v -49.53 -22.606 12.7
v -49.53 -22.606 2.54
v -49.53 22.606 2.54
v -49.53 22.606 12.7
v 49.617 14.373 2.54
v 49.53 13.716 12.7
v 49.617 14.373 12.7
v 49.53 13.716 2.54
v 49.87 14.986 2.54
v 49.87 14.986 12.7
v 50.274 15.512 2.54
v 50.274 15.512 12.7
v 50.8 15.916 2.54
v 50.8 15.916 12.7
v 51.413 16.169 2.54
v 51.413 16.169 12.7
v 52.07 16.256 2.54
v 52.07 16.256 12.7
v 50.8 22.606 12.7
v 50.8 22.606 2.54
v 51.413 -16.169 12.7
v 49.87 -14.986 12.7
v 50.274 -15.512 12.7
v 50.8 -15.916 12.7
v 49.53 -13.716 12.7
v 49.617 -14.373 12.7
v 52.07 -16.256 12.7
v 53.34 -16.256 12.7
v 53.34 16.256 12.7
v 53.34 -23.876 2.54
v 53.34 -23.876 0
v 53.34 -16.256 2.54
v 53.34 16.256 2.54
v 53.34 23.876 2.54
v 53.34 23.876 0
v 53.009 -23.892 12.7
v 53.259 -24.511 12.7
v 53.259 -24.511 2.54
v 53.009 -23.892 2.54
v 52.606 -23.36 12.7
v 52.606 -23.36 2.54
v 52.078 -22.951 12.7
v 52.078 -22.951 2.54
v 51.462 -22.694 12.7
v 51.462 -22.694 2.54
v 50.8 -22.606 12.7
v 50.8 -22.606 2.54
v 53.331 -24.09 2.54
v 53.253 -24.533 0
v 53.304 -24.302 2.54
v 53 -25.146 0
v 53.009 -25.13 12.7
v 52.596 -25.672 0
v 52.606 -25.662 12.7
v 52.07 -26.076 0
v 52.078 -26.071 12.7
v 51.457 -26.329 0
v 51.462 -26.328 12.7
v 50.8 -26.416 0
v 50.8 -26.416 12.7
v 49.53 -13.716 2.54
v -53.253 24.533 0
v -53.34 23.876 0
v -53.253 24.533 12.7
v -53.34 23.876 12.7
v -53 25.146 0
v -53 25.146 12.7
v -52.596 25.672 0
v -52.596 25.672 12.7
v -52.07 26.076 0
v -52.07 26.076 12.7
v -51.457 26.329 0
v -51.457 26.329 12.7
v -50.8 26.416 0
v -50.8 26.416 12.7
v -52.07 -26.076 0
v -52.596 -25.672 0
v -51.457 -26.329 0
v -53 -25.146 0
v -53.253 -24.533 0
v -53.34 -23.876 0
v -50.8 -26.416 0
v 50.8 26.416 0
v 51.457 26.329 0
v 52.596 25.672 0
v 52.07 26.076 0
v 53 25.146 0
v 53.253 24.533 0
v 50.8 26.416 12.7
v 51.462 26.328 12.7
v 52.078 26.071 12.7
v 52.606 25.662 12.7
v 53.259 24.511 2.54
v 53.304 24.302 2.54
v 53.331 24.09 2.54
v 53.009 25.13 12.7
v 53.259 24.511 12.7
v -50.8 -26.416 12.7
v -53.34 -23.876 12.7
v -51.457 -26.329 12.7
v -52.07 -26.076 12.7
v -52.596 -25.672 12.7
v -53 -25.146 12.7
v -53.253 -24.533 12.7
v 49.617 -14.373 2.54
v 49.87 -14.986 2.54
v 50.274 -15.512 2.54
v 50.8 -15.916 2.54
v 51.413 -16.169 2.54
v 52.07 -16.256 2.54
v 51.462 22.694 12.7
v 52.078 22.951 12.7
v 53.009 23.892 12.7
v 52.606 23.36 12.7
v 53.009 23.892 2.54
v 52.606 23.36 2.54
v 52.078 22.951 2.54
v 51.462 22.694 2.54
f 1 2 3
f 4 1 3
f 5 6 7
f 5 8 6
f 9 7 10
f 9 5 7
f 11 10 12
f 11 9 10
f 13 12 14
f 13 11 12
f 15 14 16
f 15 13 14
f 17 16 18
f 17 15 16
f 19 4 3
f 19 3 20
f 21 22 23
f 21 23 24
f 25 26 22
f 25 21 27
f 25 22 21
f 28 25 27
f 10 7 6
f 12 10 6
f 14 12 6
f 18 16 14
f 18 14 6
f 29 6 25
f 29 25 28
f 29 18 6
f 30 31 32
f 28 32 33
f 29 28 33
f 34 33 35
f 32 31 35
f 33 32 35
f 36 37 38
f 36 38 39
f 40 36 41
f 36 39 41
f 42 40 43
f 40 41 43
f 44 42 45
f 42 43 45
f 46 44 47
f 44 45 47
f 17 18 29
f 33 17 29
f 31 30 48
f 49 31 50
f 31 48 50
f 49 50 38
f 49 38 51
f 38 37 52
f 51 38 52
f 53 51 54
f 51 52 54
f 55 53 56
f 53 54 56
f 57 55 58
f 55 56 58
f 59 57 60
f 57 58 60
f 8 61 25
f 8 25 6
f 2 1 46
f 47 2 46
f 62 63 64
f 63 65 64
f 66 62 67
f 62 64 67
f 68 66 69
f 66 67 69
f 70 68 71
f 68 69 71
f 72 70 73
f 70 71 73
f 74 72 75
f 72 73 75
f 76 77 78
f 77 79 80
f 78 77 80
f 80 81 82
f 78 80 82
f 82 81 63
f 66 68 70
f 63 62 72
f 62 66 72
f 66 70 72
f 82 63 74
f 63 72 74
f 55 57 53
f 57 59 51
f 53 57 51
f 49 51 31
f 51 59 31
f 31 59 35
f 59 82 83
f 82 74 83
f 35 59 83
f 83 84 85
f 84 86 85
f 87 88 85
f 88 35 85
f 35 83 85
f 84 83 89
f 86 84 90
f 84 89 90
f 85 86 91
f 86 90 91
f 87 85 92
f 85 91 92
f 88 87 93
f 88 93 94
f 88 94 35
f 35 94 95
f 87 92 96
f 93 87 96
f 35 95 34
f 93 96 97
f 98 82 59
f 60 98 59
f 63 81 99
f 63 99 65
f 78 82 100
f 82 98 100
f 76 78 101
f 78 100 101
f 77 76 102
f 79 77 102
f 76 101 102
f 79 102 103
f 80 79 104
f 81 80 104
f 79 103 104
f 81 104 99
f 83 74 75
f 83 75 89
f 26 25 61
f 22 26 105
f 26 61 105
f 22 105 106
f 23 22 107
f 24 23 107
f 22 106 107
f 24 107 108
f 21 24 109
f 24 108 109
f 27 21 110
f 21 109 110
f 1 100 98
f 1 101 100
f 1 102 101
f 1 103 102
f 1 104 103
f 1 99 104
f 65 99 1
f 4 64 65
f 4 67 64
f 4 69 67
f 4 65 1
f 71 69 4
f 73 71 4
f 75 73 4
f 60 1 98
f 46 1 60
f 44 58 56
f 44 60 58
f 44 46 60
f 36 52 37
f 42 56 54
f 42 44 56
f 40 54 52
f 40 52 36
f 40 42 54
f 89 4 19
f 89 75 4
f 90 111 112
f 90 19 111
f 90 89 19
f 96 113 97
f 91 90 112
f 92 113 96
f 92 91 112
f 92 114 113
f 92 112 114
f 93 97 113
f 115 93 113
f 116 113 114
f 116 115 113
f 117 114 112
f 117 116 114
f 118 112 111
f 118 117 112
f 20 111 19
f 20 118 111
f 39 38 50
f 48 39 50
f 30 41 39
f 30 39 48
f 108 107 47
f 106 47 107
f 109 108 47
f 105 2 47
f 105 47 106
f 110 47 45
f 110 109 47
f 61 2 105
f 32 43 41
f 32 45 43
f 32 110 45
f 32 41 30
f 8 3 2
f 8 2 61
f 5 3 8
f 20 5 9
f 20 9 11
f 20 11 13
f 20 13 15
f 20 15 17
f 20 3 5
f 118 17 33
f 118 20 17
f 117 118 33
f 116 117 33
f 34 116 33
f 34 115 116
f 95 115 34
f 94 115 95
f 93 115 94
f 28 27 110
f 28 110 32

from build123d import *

# Parameters (mm, degrees)
F0_W     = 106.68
F0_H     = 52.832
F0_W_2   = 99.06
F0_H_2   = 45.212
F1_DEPTH = 12.7
F2_W     = 99.06
F2_H     = 45.212
F3_DEPTH = 2.54
F4_W     = 3.81
F4_H     = 6.35
F5_DEPTH = 10.16
F6_R     = 2.54


with BuildPart() as f1:
    # F0 (on Top) → F1 (new body)
    with BuildSketch(Plane.XY):
        Rectangle(F0_W, F0_H)
        Rectangle(F0_W_2, F0_H_2, mode=Mode.SUBTRACT)
    extrude(amount=F1_DEPTH)

    # F2 (on Top) → F3 (join)
    with BuildSketch(Plane.XY):
        Rectangle(F2_W, F2_H)
    extrude(amount=F3_DEPTH)

    # F4 (on face) → F5 (cut)
    with BuildSketch(Plane.XY.offset(12.7)):
        with Locations((51.435, 19.431)):
            Rectangle(F4_W, F4_H)
        with Locations((51.435, -19.431)):
            Rectangle(F4_W, F4_H)
    extrude(amount=-F5_DEPTH, mode=Mode.SUBTRACT)

    # F6 (call 1 of 8: OpenCascade refuses the feature's edges together)
    f6_edges = [f1.edges().sort_by_distance(p)[0] for p in [
        (49.53, 16.256, 7.62),
    ]]
    fillet(f6_edges, radius=F6_R)

    # F6#2 (call 2 of 8)
    f6_2_edges = [f1.edges().sort_by_distance(p)[0] for p in [
        (53.34, 22.606, 7.62),
    ]]
    fillet(f6_2_edges, radius=F6_R)

    # F6#3 (call 3 of 8)
    f6_3_edges = [f1.edges().sort_by_distance(p)[0] for p in [
        (49.53, -16.256, 7.62),
    ]]
    fillet(f6_3_edges, radius=F6_R)

    # F6#4 (call 4 of 8)
    f6_4_edges = [f1.edges().sort_by_distance(p)[0] for p in [
        (53.34, -22.606, 7.62),
    ]]
    fillet(f6_4_edges, radius=F6_R)

    # F6#5 (call 5 of 8)
    f6_5_edges = [f1.edges().sort_by_distance(p)[0] for p in [
        (53.34, 26.416, 6.35),
    ]]
    fillet(f6_5_edges, radius=F6_R)

    # F6#6 (call 6 of 8)
    f6_6_edges = [f1.edges().sort_by_distance(p)[0] for p in [
        (53.34, -26.416, 6.35),
    ]]
    fillet(f6_6_edges, radius=F6_R)

    # F6#7 (call 7 of 8)
    f6_7_edges = [f1.edges().sort_by_distance(p)[0] for p in [
        (-53.34, -26.416, 6.35),
    ]]
    fillet(f6_7_edges, radius=F6_R)

    # F6#8 (call 8 of 8)
    f6_8_edges = [f1.edges().sort_by_distance(p)[0] for p in [
        (-53.34, 26.416, 6.35),
    ]]
    fillet(f6_8_edges, radius=F6_R)


solid = f1.part
